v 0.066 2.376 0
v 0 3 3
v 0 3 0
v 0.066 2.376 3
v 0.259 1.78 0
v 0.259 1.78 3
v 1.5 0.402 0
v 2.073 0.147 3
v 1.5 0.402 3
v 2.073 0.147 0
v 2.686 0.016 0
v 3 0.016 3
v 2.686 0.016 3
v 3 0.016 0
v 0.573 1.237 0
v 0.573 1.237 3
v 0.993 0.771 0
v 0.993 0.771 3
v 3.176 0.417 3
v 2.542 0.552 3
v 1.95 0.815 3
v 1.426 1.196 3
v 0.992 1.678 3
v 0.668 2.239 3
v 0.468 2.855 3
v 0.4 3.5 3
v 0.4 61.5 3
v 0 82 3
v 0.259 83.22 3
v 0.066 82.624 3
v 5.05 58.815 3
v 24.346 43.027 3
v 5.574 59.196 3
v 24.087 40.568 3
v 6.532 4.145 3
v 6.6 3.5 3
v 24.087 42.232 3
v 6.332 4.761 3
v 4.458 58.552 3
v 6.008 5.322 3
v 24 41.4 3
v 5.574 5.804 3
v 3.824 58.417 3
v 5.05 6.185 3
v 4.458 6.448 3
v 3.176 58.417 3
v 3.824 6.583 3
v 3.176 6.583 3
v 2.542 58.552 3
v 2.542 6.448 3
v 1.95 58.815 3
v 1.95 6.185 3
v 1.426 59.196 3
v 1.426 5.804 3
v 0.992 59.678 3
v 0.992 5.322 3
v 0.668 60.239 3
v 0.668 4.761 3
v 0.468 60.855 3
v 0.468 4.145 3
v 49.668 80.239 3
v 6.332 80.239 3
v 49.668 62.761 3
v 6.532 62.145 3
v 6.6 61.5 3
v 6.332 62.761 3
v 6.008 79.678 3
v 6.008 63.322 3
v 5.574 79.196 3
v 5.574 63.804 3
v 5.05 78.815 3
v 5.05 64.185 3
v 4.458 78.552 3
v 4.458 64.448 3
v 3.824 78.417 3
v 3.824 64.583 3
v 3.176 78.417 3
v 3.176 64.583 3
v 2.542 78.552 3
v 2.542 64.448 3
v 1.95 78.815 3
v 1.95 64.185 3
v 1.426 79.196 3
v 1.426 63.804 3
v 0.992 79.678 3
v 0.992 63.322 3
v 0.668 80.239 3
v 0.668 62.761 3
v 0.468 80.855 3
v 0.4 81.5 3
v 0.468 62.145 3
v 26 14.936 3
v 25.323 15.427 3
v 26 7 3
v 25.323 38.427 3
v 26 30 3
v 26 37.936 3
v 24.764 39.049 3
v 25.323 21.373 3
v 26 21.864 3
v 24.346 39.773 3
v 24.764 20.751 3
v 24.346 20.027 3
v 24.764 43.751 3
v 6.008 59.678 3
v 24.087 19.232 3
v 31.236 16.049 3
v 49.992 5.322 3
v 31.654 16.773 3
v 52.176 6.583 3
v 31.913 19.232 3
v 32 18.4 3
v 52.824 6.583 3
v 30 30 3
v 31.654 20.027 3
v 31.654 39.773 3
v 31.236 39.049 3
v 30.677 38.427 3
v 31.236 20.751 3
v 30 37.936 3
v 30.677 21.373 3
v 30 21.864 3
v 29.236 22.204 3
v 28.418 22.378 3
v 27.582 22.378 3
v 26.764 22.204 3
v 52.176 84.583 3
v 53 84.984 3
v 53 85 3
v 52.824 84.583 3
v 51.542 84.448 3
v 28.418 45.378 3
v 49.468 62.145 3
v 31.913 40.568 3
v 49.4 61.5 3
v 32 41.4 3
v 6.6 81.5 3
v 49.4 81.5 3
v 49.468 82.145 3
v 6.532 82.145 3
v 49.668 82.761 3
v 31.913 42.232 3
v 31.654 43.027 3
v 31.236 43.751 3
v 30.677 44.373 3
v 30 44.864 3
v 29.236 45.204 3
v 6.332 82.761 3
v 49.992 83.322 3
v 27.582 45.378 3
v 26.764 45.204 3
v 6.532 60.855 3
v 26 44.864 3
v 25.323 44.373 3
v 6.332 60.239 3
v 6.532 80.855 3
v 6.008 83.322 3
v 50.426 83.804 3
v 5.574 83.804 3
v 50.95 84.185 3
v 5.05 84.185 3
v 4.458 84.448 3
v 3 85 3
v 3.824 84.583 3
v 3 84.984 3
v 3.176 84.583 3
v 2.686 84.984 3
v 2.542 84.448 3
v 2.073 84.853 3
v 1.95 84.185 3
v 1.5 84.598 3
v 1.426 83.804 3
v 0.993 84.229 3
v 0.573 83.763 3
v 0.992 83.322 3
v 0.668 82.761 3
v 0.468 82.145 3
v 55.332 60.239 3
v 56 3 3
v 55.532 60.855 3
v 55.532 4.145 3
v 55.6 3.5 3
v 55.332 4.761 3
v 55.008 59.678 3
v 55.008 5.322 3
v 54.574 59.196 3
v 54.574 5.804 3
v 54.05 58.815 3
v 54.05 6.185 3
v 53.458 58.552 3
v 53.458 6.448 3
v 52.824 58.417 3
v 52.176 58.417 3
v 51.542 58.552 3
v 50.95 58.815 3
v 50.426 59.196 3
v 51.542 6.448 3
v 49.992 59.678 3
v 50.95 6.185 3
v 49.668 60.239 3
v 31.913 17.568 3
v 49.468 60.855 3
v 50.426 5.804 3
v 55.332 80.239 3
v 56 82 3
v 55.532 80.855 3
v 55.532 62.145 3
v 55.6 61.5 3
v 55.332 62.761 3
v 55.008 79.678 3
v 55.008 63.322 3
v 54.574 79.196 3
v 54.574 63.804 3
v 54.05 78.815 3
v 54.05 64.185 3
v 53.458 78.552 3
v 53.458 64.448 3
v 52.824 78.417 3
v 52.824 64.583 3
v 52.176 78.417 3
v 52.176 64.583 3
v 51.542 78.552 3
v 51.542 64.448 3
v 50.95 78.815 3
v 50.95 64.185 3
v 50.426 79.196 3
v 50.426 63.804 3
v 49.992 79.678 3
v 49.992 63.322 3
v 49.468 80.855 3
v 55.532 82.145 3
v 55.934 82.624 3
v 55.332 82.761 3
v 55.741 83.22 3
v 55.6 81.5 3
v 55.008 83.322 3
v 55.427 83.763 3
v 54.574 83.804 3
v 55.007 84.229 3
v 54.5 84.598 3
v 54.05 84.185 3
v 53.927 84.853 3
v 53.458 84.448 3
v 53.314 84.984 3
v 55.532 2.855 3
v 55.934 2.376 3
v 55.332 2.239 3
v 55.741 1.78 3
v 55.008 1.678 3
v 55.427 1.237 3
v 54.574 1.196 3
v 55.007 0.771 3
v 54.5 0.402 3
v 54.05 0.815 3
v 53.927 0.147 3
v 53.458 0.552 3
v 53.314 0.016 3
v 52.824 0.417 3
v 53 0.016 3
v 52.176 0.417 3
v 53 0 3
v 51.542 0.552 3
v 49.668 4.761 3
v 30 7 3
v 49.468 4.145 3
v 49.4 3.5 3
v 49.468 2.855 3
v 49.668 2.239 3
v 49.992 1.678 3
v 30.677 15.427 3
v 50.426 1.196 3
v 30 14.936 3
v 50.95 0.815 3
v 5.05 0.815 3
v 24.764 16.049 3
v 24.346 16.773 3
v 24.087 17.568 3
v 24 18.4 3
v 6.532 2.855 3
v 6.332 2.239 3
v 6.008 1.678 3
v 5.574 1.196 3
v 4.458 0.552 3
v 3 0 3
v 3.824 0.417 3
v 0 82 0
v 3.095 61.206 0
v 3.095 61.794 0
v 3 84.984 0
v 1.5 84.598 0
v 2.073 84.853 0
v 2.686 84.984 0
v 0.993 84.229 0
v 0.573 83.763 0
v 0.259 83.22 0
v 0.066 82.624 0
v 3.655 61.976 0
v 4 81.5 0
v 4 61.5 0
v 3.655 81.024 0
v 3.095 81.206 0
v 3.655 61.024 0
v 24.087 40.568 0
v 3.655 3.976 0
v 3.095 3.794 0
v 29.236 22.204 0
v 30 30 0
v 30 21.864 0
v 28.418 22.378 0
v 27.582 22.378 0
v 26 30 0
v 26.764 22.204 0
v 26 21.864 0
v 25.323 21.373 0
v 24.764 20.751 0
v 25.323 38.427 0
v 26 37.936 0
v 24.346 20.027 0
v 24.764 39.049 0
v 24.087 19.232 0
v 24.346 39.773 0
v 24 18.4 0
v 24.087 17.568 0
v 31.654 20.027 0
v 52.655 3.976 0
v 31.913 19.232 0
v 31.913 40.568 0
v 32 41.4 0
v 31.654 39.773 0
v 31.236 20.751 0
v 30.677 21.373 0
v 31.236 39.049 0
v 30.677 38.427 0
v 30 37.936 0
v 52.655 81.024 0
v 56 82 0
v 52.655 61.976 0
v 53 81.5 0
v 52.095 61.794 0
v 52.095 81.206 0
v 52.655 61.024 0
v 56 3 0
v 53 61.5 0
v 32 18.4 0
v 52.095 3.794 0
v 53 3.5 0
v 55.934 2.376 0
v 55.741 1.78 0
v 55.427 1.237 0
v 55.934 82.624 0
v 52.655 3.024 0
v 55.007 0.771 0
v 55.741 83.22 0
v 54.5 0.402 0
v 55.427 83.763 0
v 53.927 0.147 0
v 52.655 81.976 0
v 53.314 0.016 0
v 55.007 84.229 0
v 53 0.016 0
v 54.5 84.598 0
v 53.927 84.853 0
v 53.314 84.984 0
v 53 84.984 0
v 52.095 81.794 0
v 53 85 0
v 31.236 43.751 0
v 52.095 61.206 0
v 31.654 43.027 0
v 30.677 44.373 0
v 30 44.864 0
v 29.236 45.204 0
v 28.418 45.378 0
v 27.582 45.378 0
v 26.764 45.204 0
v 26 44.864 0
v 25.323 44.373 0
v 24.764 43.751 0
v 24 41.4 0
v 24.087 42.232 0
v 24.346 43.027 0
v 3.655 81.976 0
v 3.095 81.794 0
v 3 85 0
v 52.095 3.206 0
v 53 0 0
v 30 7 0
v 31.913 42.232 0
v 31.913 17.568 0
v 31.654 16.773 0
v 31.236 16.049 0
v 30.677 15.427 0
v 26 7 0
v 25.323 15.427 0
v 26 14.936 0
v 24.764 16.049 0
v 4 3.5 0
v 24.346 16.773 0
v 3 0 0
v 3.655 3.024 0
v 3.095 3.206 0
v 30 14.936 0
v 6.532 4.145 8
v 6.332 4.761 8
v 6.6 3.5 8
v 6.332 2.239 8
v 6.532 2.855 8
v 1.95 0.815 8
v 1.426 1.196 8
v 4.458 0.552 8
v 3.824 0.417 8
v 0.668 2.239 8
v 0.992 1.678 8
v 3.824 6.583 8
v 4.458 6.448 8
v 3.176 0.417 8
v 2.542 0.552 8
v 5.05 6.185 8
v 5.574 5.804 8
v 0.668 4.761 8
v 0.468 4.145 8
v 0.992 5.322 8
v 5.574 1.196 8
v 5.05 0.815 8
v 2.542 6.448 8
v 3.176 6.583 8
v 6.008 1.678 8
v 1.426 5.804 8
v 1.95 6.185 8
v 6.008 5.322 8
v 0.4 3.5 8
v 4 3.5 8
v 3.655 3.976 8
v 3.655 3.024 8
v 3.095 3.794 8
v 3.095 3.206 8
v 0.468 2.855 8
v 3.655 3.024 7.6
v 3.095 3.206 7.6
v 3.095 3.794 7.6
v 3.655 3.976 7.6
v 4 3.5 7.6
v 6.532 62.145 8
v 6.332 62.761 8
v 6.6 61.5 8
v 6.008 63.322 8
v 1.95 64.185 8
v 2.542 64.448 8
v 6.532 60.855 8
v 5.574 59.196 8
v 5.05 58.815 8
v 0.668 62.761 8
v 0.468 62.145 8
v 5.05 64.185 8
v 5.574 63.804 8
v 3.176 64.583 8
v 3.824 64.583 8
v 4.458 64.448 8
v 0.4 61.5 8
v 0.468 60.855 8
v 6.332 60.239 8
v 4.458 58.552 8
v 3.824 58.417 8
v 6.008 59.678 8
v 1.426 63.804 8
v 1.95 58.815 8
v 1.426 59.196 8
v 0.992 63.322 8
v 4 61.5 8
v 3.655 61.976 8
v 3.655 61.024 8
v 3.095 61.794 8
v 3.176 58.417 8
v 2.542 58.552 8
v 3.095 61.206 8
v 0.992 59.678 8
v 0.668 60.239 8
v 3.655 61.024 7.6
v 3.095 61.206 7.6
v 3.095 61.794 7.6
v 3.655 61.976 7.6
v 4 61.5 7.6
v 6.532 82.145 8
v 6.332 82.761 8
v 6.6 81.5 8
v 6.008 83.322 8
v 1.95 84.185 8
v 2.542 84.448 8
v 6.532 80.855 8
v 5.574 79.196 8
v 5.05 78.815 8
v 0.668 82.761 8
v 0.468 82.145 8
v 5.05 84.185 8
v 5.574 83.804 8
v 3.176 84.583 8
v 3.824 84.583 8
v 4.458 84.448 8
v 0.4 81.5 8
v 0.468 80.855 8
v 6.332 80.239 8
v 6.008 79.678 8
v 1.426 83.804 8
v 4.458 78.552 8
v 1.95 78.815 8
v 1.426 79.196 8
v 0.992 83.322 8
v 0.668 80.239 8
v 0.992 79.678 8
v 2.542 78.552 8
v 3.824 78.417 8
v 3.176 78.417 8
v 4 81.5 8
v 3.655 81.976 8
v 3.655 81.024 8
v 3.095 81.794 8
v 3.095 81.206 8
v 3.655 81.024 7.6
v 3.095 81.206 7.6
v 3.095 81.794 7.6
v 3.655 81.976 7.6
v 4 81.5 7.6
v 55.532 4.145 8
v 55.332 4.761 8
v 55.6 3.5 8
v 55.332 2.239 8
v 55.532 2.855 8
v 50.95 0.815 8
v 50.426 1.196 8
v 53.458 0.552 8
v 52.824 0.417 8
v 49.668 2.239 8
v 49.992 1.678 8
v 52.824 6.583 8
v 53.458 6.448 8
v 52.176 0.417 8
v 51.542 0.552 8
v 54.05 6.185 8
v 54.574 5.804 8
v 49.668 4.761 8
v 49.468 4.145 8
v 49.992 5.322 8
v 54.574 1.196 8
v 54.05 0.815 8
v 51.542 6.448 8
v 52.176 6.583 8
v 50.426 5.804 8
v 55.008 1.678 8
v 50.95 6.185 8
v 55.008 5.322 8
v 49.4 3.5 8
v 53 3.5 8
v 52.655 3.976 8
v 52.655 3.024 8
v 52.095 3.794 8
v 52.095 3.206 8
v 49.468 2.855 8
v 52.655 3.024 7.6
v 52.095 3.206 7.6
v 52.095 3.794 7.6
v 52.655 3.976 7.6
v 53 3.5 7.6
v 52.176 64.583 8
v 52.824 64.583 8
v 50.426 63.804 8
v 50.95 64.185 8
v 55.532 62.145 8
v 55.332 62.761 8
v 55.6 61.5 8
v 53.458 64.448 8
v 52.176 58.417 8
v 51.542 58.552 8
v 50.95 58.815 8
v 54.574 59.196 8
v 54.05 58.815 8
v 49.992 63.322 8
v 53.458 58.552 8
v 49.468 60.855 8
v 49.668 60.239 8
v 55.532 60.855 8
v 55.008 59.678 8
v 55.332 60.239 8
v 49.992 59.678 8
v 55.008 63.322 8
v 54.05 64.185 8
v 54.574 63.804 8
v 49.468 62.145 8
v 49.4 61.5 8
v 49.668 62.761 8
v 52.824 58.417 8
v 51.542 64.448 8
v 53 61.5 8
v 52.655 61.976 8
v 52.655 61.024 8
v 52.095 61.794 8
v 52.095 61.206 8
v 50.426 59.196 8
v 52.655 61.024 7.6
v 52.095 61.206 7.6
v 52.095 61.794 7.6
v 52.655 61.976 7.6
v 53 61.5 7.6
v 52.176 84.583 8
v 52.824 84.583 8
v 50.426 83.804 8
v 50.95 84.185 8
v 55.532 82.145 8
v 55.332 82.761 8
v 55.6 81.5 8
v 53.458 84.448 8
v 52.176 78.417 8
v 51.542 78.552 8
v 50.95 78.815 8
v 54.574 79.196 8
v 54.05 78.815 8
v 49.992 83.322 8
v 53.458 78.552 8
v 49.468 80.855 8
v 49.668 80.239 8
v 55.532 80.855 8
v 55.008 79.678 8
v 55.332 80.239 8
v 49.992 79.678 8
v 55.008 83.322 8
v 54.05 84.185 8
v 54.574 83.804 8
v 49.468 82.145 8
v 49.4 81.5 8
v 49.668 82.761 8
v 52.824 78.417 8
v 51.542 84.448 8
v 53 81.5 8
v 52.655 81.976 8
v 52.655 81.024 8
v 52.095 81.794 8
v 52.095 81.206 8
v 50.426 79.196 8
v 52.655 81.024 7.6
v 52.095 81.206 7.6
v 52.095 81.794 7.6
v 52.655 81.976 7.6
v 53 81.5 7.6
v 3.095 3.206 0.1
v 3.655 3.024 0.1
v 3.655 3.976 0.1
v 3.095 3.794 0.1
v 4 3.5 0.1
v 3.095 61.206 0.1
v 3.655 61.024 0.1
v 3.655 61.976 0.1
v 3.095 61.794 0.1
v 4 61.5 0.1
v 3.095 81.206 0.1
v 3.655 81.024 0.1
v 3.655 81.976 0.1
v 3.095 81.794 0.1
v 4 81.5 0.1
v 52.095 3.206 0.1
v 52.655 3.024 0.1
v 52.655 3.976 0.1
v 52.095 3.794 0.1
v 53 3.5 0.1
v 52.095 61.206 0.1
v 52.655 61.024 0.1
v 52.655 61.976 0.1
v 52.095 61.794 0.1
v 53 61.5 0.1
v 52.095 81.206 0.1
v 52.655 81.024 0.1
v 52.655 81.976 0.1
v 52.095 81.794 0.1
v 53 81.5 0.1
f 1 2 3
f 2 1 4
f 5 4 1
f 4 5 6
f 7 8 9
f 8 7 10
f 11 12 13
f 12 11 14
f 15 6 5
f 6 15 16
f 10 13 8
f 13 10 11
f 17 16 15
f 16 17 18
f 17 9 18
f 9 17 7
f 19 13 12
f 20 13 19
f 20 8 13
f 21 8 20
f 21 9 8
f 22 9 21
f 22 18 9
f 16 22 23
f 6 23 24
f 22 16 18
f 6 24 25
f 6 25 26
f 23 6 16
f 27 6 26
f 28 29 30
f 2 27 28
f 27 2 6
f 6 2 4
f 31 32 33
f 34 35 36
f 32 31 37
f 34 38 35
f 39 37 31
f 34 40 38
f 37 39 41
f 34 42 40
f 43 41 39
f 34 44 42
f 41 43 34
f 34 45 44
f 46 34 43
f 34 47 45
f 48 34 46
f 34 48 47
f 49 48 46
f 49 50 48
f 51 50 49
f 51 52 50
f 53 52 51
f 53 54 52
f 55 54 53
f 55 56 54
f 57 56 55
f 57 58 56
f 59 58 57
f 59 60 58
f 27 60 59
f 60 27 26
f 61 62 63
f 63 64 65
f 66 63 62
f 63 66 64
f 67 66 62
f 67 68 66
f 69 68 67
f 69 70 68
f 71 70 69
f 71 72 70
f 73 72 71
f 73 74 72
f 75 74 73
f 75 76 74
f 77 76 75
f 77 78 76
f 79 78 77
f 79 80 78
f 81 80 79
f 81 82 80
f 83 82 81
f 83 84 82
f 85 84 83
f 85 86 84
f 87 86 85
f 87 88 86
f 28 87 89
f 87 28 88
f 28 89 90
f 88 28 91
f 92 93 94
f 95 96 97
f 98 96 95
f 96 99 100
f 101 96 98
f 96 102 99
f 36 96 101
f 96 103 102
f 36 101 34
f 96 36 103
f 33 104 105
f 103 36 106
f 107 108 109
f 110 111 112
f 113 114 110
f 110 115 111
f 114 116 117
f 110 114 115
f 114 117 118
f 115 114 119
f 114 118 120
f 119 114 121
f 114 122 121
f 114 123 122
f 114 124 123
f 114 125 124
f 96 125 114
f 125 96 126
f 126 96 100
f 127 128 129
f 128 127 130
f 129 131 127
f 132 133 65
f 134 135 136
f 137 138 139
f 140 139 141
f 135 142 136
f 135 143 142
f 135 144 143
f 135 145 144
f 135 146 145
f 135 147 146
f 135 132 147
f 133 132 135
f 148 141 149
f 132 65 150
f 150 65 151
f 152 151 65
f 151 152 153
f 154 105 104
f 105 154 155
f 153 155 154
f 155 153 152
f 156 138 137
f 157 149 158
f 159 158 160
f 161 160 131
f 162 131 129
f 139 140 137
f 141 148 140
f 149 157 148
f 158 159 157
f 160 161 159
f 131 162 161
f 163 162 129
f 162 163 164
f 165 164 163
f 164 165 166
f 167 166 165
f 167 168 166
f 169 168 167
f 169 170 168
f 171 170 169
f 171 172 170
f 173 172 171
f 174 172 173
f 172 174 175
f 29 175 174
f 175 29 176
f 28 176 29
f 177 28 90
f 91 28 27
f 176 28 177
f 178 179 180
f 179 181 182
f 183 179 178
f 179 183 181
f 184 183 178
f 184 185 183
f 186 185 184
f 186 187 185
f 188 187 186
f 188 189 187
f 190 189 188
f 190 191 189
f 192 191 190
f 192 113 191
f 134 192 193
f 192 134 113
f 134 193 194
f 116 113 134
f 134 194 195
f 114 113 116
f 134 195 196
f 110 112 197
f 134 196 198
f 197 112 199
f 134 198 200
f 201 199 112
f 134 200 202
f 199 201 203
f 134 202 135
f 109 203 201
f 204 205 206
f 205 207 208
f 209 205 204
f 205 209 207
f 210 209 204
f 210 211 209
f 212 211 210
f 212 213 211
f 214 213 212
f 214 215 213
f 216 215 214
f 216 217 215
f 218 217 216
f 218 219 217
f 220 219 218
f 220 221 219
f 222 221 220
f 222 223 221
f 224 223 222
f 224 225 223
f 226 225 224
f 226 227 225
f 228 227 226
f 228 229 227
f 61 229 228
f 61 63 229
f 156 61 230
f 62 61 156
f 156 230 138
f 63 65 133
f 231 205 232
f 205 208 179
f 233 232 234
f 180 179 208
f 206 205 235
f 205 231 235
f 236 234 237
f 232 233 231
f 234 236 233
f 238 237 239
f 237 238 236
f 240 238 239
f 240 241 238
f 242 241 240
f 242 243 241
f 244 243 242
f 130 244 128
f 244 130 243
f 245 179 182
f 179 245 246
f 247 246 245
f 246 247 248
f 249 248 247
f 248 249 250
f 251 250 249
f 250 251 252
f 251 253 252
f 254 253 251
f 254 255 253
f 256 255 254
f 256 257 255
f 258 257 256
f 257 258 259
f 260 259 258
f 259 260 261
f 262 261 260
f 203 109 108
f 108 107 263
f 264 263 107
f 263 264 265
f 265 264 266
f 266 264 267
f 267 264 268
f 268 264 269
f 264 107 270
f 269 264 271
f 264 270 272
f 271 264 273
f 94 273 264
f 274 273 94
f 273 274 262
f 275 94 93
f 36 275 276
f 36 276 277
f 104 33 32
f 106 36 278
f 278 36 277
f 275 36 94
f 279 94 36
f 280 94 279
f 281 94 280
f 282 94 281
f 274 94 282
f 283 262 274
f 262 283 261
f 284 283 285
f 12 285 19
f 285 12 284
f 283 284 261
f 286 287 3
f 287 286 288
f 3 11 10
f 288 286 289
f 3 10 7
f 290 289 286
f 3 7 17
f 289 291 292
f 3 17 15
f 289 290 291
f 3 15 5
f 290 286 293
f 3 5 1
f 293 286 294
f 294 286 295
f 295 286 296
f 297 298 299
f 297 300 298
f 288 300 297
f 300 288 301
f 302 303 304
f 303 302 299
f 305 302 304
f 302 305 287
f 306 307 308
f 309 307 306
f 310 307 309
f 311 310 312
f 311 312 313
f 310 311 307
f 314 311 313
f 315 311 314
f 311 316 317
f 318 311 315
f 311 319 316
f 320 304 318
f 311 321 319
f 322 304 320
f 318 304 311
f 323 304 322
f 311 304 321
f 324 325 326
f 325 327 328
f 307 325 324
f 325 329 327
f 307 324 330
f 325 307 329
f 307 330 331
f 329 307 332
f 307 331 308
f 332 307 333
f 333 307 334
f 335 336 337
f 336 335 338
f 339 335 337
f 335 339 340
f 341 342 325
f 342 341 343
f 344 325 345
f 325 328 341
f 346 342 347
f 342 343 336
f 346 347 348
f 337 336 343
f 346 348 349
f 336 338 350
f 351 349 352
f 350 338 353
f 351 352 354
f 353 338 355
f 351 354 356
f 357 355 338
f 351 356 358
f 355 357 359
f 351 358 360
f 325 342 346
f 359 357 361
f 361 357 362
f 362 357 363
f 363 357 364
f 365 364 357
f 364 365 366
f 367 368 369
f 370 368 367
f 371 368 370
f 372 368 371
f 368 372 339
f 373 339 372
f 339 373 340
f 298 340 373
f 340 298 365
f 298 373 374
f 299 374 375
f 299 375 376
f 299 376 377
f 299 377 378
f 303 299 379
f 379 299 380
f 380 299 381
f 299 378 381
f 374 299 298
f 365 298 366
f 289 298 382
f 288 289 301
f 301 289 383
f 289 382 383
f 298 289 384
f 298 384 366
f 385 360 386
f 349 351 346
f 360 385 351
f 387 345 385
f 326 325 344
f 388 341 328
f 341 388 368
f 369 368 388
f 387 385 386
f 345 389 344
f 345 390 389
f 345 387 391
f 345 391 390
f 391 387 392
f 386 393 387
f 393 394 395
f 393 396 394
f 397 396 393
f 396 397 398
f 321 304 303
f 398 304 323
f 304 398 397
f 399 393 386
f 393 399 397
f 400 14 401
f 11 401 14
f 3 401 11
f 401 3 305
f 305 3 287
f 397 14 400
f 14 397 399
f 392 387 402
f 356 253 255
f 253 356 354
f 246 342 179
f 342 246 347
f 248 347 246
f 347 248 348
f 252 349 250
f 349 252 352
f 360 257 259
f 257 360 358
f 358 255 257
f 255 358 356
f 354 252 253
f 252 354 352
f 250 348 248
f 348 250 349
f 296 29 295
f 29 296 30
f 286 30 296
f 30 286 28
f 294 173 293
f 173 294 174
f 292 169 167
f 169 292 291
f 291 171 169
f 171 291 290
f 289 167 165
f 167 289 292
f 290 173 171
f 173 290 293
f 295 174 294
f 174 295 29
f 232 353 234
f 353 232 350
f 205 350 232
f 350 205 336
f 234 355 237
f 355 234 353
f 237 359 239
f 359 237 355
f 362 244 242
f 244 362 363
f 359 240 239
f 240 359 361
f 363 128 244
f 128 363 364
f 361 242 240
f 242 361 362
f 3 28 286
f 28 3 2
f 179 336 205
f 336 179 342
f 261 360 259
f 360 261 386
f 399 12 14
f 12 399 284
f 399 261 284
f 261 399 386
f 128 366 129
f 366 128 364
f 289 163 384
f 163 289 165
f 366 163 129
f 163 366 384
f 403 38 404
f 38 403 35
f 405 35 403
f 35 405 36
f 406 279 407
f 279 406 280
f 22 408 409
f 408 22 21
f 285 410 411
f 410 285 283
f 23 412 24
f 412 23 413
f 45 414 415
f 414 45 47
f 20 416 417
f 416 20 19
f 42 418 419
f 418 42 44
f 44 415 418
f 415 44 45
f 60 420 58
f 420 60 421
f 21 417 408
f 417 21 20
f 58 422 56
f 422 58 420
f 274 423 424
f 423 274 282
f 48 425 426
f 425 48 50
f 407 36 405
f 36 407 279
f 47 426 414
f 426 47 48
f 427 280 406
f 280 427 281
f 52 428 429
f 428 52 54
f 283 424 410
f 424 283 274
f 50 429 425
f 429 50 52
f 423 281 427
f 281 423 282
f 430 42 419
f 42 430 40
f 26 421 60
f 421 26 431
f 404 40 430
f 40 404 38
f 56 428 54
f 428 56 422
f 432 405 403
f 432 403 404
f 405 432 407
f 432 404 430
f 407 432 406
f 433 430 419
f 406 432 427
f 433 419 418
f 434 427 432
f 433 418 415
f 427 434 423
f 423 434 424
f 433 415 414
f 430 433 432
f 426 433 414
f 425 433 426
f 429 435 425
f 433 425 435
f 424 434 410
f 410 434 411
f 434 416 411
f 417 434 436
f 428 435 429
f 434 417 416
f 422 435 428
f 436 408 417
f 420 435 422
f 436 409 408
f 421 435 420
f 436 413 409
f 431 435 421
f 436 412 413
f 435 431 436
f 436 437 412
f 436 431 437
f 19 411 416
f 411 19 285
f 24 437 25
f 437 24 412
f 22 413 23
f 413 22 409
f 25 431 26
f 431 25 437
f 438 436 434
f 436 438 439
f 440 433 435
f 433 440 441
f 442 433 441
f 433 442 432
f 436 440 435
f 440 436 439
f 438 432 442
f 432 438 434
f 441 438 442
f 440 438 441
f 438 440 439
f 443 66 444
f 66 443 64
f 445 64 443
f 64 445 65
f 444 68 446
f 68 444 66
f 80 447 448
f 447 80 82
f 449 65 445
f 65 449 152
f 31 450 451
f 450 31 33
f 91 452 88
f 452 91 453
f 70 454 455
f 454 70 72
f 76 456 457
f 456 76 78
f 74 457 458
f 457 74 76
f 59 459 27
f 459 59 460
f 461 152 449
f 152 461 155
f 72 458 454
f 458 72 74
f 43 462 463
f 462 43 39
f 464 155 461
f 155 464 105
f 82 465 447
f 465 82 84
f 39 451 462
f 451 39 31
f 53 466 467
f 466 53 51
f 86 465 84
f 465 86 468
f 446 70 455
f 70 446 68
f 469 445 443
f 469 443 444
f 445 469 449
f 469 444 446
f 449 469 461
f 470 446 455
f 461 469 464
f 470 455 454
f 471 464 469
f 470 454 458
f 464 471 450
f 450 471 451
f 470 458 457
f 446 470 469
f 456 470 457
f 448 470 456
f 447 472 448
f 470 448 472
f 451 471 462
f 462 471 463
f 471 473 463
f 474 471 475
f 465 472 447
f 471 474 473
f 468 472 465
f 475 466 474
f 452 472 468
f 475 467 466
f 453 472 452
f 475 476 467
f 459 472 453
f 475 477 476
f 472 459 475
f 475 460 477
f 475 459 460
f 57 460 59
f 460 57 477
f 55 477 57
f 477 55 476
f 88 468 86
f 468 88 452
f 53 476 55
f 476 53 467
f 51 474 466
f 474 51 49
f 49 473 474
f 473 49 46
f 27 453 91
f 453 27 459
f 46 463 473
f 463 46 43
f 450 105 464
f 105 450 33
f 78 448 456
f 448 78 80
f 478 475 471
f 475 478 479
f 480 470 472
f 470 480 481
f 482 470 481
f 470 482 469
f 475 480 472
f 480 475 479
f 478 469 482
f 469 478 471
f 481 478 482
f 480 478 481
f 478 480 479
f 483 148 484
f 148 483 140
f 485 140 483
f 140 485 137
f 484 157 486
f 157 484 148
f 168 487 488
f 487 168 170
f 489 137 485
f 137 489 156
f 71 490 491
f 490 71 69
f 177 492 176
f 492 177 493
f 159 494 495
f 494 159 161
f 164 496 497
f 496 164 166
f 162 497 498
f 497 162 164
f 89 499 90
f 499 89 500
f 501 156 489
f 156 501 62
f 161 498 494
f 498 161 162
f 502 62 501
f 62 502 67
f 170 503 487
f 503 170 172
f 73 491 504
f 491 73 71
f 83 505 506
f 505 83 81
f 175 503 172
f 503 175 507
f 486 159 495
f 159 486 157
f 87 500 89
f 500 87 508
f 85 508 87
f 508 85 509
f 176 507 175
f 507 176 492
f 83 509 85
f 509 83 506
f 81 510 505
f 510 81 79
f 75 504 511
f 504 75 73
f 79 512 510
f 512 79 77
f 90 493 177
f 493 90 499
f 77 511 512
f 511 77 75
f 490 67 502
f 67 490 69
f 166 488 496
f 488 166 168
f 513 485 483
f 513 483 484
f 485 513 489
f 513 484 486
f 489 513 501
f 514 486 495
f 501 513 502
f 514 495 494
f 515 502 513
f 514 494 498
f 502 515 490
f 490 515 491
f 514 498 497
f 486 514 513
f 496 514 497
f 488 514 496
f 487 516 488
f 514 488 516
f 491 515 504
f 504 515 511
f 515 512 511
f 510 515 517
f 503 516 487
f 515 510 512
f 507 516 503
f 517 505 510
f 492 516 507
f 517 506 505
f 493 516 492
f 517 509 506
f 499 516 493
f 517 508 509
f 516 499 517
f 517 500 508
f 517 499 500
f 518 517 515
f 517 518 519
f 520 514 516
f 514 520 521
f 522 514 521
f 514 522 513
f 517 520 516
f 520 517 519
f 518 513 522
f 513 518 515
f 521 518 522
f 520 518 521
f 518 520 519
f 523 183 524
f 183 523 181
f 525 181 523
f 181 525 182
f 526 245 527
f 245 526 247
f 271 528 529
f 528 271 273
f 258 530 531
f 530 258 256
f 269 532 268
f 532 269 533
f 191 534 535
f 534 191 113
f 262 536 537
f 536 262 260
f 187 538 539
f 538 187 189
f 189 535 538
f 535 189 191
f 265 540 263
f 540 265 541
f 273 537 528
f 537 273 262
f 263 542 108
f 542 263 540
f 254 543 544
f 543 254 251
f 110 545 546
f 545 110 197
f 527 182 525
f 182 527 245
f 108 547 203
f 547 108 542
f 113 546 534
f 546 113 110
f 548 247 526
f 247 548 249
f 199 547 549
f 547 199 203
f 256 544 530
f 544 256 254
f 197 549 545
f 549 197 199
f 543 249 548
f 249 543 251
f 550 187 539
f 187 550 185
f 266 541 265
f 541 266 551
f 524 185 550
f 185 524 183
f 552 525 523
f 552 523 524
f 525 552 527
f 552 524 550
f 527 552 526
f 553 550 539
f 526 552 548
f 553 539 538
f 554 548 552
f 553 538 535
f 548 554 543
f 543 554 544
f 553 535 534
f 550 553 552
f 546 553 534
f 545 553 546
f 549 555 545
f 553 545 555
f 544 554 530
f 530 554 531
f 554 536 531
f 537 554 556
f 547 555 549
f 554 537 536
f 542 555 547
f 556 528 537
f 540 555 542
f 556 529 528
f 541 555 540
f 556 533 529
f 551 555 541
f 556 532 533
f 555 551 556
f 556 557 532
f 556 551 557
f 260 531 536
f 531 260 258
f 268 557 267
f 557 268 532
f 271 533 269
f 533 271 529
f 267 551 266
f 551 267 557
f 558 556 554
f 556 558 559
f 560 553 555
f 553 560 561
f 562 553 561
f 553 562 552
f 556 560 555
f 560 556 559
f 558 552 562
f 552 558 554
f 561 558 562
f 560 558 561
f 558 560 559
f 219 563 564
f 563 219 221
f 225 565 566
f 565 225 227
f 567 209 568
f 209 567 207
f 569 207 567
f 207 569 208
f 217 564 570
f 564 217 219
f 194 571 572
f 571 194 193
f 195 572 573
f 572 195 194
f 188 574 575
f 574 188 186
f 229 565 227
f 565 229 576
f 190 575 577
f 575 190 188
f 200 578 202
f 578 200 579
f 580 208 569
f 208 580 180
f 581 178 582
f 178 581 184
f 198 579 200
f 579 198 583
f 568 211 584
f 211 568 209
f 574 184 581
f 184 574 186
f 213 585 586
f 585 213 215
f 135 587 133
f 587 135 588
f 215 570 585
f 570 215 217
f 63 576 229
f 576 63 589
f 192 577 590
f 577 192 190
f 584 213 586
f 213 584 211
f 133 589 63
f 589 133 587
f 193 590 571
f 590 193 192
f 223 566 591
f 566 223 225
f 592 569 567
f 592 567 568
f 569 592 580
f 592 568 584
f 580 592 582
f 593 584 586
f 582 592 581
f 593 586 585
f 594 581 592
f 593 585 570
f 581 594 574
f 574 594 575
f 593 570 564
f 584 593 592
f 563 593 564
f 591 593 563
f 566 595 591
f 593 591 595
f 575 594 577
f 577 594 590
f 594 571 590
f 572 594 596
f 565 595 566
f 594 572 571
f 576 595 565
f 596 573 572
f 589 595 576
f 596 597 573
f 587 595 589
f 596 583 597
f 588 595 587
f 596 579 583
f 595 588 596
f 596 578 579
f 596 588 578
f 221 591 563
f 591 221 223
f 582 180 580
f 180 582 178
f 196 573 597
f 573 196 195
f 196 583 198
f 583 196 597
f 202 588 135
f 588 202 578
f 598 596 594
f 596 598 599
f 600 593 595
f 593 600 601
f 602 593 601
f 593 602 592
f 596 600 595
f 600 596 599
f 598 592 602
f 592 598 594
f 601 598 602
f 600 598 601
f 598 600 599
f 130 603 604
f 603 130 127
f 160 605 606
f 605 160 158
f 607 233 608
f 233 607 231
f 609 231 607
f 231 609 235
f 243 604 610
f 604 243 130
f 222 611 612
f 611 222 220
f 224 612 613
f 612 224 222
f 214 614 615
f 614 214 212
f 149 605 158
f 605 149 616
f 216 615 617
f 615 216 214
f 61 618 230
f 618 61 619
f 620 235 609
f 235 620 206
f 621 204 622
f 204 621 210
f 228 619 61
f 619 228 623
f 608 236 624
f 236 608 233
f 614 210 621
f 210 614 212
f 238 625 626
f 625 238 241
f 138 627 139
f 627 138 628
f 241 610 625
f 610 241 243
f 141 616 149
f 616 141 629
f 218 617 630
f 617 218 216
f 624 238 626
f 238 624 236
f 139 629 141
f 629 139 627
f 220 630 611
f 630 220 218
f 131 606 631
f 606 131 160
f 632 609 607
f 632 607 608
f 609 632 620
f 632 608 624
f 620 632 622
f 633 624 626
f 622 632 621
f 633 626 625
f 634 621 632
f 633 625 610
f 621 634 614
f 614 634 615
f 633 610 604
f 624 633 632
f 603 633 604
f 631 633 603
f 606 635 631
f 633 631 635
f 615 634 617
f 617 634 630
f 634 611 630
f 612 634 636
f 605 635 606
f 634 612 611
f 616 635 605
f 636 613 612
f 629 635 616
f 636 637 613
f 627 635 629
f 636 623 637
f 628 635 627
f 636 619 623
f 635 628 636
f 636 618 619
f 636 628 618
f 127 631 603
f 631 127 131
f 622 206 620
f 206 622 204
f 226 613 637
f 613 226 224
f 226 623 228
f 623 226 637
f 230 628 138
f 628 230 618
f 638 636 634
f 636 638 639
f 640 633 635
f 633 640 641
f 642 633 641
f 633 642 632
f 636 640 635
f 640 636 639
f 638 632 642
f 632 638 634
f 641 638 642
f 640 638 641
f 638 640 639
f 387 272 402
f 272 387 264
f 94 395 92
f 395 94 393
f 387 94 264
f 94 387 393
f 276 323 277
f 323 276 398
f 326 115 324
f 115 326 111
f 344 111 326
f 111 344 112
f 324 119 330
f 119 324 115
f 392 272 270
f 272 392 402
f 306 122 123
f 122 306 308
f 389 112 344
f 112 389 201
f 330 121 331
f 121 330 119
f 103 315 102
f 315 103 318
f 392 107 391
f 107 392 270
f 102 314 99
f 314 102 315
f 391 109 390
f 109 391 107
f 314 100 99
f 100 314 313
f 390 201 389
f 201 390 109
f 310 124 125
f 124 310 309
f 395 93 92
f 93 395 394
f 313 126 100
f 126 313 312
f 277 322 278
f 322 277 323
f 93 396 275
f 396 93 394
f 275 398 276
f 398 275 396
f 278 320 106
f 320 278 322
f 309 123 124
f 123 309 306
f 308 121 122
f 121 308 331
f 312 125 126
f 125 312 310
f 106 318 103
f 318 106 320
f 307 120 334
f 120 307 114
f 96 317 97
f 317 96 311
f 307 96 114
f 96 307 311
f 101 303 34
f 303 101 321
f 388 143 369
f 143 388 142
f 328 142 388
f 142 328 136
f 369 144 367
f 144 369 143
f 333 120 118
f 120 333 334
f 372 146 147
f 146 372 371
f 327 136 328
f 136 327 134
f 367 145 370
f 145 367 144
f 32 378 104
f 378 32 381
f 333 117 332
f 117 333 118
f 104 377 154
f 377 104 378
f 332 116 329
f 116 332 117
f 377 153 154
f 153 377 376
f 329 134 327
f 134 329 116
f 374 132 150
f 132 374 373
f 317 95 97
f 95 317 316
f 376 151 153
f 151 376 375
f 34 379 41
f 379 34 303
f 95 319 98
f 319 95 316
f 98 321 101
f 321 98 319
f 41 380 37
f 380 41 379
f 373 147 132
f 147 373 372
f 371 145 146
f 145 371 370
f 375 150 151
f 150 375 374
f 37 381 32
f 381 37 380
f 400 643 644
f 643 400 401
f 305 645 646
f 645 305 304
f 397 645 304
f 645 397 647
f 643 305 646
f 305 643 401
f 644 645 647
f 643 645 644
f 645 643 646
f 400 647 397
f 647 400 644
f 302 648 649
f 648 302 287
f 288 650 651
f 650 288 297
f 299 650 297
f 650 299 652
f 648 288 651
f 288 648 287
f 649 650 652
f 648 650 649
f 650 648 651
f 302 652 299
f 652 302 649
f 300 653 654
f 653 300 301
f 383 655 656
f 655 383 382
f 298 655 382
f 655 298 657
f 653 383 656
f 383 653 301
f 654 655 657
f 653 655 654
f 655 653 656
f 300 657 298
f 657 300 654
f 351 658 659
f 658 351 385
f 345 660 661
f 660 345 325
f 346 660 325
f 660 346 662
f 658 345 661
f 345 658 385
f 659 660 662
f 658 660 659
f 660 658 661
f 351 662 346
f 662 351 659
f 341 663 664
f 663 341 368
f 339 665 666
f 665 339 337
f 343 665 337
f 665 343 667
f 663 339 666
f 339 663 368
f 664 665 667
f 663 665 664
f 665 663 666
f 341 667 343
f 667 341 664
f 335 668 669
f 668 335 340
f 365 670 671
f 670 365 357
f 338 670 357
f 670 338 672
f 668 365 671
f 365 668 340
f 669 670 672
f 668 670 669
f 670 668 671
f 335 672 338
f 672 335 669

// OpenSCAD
difference() {
  difference() {
    union() {
      //center rect
      translate([3,3,0]) cube([56-3*2,85-3*2,3]);

      //corner roundnesses
      union() {
        translate([3,3,0]) cylinder(r=3,h=3,$fn=30);
        translate([56-3,3,0]) cylinder(r=3,h=3,$fn=30);
        translate([3,85-3,0]) cylinder(r=3,h=3,$fn=30);
        translate([56-3,85-3,0]) cylinder(r=3,h=3,$fn=30);
      }

      //sides
      union() {
        translate([0,3,0]) cube([3,85-3*2,3]);
        translate([56-3,3,0]) cube([3,85-3*2,3]);
        translate([3,0,0]) cube([56-3*2,3,3]);
        translate([3,85-3,0]) cube([56-3*2,3,3]);
      }

      //posts/supports
      translate([3.5,3.5,3])
        union() {
          for (x = [0,49]) {
            for (y= [0,58,85-3.5*2]) {
              difference() {
                translate([x,y,0]) cylinder(r=3.1, h=5, $fn=30);
                translate([x,y,4.6]) cylinder(r=0.5, h=0.5);
              }
            }
          }
        }
    }

    union() {
      for (yoffsetdelta = [0, 23]) {
        translate([56/2-2,yoffsetdelta+7,-0.05]) union() {
          cube([4,8,3.1]);
          translate([2,8+3.4,0]) cylinder(r=4,h=3.1, $fn=30);
        }
      }
    }
  }

  translate([3.5,3.5,0])
    for (x = [0,49]) {
      for (y= [0,58,85-3.5*2]) {
        translate([x,y,-.4]) cylinder(r=0.5, h=0.5);
      }
    }
}
